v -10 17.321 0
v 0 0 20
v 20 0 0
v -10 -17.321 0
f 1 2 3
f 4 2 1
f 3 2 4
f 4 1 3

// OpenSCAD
//-- Cilindro normal. r es radio, h es altura
*cylinder(r=20,h=20,$fn=100);

//-- Cono truncado. r1 radio base inferior, r2 radio base superior
*cylinder(r1=20,r2=10,h=20,$fn=100);

//-- Cono
*cylinder(r1=20,r2=0,h=20,$fn=100);

//-- Pirámide de base hexagonal
*cylinder(r1=20,r2=10,h=20,$fn=6);

//-- Pirámide
*cylinder(r1=20,r2=0,h=20,$fn=4);

//-- Tetrahedro
cylinder(r1=20,r2=0,h=20,$fn=3);
